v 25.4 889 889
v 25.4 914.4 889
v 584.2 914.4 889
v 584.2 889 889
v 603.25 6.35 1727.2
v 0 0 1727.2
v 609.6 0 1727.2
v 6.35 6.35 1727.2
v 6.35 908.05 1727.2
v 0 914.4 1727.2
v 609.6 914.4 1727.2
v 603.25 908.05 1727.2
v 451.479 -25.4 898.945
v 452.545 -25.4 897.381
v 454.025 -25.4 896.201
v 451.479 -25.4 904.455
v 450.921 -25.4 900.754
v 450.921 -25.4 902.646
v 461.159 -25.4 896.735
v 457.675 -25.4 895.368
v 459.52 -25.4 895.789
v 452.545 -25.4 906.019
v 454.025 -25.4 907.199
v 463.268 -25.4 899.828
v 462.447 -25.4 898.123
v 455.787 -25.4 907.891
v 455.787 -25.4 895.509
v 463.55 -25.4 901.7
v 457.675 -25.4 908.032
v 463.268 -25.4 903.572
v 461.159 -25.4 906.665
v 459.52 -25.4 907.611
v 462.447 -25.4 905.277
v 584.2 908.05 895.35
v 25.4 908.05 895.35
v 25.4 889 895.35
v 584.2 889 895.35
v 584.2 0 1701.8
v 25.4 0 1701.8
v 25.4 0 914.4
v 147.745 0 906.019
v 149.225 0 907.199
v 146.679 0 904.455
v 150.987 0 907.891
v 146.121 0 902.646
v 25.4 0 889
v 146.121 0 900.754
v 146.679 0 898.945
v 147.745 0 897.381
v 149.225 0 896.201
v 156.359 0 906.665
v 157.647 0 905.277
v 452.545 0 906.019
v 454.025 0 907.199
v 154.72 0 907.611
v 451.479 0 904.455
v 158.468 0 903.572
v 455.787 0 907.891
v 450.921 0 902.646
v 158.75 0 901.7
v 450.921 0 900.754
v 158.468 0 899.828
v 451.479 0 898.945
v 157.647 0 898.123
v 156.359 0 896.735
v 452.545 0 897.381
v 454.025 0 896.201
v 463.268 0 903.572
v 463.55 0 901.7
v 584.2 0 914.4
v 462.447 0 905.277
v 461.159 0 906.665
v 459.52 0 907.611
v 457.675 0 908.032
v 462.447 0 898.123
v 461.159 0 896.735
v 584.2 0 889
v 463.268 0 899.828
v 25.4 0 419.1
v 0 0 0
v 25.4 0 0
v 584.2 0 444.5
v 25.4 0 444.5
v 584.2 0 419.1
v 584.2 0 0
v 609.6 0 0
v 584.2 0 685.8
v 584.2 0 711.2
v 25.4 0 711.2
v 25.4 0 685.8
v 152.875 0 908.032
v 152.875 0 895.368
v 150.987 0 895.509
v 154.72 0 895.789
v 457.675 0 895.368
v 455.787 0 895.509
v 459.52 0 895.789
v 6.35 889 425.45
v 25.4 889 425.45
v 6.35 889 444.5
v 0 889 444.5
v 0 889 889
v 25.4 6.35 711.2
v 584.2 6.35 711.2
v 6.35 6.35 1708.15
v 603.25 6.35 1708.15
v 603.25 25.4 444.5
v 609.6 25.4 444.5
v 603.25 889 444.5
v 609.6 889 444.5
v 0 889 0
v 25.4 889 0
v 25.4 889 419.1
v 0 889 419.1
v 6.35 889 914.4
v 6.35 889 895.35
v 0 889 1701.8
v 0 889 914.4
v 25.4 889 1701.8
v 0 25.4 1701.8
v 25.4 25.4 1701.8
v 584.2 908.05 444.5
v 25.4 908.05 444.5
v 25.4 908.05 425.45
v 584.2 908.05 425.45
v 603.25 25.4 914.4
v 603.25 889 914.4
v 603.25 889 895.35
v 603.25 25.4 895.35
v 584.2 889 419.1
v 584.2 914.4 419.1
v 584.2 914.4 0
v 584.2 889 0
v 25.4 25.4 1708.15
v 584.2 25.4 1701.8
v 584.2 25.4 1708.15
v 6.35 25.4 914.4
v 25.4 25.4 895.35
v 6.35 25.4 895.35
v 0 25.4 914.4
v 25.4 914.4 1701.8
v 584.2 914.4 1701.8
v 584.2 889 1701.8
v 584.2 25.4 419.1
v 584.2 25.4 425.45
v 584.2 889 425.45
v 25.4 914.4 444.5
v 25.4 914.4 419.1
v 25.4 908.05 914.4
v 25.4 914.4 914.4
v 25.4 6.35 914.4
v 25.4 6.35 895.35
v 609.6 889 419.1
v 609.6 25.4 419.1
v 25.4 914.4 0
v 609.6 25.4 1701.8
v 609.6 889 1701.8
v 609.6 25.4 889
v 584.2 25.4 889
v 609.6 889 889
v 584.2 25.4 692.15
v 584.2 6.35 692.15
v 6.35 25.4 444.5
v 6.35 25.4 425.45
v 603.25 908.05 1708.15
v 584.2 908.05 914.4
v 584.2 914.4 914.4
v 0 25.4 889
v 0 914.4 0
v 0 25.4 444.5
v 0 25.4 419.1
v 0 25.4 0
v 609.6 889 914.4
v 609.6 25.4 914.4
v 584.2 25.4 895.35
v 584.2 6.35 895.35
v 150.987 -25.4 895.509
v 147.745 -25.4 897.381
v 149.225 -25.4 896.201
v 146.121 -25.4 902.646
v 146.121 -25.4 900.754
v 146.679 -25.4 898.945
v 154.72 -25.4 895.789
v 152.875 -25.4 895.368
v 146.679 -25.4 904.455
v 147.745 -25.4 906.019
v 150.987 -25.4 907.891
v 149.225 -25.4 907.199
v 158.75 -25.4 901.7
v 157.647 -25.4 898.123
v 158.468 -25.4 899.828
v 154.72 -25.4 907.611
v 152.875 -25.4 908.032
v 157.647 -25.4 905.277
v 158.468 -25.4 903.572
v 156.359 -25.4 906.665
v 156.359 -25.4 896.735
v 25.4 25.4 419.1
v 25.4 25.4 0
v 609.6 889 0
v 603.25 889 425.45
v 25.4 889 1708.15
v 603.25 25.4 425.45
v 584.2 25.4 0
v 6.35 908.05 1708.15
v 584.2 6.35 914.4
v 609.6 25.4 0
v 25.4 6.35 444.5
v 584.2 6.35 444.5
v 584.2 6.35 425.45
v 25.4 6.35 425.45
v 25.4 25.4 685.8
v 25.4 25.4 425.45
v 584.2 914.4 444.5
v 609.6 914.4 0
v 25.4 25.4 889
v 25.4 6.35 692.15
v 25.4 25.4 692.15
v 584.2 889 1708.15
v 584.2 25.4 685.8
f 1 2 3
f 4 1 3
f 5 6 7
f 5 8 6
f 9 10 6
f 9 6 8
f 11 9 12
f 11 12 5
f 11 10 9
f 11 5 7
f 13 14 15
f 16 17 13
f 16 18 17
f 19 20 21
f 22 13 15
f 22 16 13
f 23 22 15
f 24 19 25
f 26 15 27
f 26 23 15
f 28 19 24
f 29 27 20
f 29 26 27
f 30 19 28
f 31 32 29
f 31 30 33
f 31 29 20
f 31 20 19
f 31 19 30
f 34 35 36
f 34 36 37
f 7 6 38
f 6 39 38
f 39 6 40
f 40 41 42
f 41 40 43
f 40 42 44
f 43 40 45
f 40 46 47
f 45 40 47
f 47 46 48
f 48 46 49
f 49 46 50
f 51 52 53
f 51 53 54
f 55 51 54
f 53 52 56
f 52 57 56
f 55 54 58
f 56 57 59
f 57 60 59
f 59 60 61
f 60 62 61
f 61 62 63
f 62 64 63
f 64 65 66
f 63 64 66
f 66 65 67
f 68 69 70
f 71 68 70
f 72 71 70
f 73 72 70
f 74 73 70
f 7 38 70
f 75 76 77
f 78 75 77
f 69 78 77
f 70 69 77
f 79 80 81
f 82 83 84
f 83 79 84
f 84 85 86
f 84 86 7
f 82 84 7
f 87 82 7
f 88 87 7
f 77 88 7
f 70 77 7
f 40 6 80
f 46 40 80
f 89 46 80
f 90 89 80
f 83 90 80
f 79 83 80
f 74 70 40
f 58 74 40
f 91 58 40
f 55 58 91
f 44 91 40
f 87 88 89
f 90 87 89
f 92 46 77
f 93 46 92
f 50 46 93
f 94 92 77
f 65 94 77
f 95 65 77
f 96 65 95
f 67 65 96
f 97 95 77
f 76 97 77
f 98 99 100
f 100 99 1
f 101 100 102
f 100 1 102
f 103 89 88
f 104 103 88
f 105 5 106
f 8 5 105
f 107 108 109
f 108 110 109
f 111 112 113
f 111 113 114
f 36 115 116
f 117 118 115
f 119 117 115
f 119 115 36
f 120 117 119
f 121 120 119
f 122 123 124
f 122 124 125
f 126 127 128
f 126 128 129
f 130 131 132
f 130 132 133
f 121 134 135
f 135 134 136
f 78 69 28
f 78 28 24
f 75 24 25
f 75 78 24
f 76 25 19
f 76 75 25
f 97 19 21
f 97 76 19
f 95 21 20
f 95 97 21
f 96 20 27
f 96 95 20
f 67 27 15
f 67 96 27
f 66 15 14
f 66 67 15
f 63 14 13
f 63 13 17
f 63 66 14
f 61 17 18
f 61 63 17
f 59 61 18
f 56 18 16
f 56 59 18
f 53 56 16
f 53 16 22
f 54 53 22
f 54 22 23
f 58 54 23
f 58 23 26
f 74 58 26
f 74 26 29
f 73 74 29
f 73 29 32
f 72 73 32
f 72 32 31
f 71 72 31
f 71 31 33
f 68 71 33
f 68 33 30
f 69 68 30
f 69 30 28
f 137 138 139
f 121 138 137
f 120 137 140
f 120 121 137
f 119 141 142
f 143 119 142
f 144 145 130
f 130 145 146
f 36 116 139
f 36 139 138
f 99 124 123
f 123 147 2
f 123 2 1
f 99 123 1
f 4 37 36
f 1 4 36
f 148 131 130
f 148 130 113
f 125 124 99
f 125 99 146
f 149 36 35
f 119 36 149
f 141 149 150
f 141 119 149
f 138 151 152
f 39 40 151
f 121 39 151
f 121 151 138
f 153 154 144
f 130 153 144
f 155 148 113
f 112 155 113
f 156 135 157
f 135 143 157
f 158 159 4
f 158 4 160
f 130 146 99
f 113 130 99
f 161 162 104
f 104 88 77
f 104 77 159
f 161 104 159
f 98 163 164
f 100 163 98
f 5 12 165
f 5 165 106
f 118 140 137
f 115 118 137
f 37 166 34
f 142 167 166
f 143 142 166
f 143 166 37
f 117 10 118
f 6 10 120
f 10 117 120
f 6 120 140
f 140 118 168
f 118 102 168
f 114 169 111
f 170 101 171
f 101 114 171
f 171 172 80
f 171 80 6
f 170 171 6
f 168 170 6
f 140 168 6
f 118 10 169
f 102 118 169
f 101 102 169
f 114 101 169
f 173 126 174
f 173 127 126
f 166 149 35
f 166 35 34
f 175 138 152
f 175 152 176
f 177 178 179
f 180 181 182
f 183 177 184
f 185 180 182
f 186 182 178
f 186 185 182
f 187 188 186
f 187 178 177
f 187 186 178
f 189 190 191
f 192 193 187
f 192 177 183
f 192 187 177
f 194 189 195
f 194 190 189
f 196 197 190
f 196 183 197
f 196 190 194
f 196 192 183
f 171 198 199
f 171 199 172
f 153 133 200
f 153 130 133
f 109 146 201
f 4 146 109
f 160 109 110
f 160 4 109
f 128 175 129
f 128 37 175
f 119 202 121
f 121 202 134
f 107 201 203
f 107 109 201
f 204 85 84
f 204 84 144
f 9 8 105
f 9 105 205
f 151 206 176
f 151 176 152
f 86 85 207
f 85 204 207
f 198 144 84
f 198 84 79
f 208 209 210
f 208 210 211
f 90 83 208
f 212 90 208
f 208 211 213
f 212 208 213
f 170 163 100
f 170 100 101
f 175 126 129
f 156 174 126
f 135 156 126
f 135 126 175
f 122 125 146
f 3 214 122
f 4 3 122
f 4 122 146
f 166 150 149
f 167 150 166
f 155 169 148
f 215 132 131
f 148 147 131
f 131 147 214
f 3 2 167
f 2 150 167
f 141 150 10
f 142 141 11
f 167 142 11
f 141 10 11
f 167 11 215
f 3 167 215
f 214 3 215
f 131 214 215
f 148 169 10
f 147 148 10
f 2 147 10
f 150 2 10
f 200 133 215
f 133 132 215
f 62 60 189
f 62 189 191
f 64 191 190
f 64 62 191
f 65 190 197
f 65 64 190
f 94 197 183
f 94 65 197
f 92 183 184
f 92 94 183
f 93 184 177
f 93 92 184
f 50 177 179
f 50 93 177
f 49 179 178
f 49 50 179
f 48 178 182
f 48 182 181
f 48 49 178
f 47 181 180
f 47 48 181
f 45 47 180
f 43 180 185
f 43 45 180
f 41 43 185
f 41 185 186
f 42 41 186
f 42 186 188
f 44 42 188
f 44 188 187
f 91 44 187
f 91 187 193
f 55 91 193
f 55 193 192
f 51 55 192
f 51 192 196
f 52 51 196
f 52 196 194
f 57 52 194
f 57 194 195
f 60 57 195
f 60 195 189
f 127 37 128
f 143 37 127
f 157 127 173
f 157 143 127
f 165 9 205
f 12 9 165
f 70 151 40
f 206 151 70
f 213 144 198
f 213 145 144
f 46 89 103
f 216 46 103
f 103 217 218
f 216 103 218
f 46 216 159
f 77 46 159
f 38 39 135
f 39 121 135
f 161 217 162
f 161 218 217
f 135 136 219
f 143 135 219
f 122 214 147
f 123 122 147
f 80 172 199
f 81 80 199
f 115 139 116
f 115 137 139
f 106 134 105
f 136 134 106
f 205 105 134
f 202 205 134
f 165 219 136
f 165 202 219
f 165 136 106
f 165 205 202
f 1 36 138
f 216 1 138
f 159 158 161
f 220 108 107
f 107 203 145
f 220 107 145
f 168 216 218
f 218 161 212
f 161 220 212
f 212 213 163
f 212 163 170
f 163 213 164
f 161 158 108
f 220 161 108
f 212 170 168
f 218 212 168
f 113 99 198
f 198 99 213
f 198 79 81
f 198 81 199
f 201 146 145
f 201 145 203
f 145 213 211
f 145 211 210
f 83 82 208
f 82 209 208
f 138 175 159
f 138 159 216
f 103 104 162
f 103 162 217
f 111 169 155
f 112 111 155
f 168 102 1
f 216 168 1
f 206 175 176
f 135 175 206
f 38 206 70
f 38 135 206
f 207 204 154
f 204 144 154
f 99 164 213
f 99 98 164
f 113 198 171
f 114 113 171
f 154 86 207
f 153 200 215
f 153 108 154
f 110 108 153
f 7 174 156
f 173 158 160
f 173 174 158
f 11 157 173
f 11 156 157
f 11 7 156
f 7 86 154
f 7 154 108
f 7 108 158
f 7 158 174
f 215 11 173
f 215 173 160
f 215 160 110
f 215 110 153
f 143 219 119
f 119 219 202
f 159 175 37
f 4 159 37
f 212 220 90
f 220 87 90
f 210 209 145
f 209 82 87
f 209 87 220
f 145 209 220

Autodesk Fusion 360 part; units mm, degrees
sketch "Sketch1" plane through (0, 0, 0) normal (0, 0, 1) x (1, 0, 0)
  line L0 (0, 0) -> (25.4, 0)
  line L1 (25.4, 0) -> (25.4, 25.4)
  line L2 (25.4, 25.4) -> (0, 25.4)
  line L3 (0, 25.4) -> (0, 0)
  dimension "d1" = 25.4
  dimension "d2" = 25.4
extrude "Extrude1" add sketch "Sketch1" along normal blind 914.4 makes body 1
sketch "Sketch2" plane through (0, 0, 914.4) normal (0, 0, 1) x (1, 0, 0)
  line L0 (0, 25.4) -> (0, 0)
  line L1 (0, 0) -> (25.4, 0)
  line L2 (25.4, 0) -> (25.4, 25.4)
  line L3 (25.4, 25.4) -> (0, 25.4)
  line L4 (0, 0) -> (609.6, 0)
  line L5 (609.6, 0) -> (609.6, 914.4)
  line L6 (609.6, 914.4) -> (0, 914.4)
  line L7 (0, 914.4) -> (0, 0)
  dimension "d5" = 609.6
  dimension "d6" = 914.4
sketch "Sketch3" plane through (0, 0, 914.4) normal (0, 0, 1) x (1, 0, 0)
  line L0 (0, 914.4) -> (25.4, 914.4)
  line L1 (25.4, 914.4) -> (25.4, 889)
  line L2 (25.4, 889) -> (0, 889)
  line L3 (0, 889) -> (0, 914.4)
  line L4 (609.6, 914.4) -> (0, 914.4)
  line L5 (0, 914.4) -> (0, 0)
  line L6 (609.6, 914.4) -> (584.2, 914.4)
  line L7 (584.2, 914.4) -> (584.2, 889)
  line L8 (584.2, 889) -> (609.6, 889)
  line L9 (609.6, 889) -> (609.6, 914.4)
  line L10 (609.6, 0) -> (609.6, 914.4)
  line L11 (609.6, 0) -> (584.2, 0)
  line L12 (584.2, 0) -> (584.2, 25.4)
  line L13 (584.2, 25.4) -> (609.6, 25.4)
  line L14 (609.6, 25.4) -> (609.6, 0)
  line L15 (0, 0) -> (609.6, 0)
  dimension "d7" = 25.4
  dimension "d8" = 25.4
  dimension "d9" = 25.4
  dimension "d10" = 25.4
  dimension "d11" = 25.4
  dimension "d12" = 25.4
extrude "Extrude2" add sketch "Sketch3" against normal blind 914.4 separate body contours L0 L1 L2 L3 L4 L5 | L4 L6 L7 L8 L9 L10 | L10 L11 L12 L13 L14 L15 makes body 2 at (25.4, 905.9333, 304.8) makes body 3 at (609.6, 897.4667, 304.8) makes body 4 at (584.2, 8.4667, 304.8)
sketch "Sketch4" plane through (0, 0, 914.4) normal (0, 0, 1) x (1, 0, 0)
  line L0 (584.2, 889) -> (609.6, 889)
  line L1 (609.6, 889) -> (609.6, 25.4)
  line L2 (609.6, 25.4) -> (584.2, 25.4)
  line L3 (584.2, 25.4) -> (584.2, 889)
  line L4 (0, 914.4) -> (584.2, 914.4)
  line L5 (584.2, 914.4) -> (584.2, 889)
  line L6 (584.2, 889) -> (0, 889)
  line L7 (0, 889) -> (0, 914.4)
  line L8 (0, 914.4) -> (25.4, 914.4)
  line L9 (25.4, 914.4) -> (25.4, 0)
  line L10 (25.4, 0) -> (0, 0)
  line L11 (0, 0) -> (0, 914.4)
  line L12 (0, 0) -> (584.2, 0)
  line L13 (584.2, 0) -> (584.2, 25.4)
  line L14 (584.2, 25.4) -> (0, 25.4)
  line L15 (0, 25.4) -> (0, 0)
  line L16 (0, 0) -> (609.6, 0)
  line L17 (0, 914.4) -> (0, 0)
  line L18 (609.6, 914.4) -> (0, 914.4)
  line L19 (609.6, 0) -> (609.6, 914.4)
  line L20 (609.6, 889) -> (609.6, 914.4)
  line L21 (609.6, 914.4) -> (584.2, 914.4)
  dimension "d15" = 25.4
  dimension "d16" = 25.4
  dimension "d17" = 25.4
  dimension "d18" = 25.4
extrude "Extrude3" add sketch "Sketch4" against normal blind 25.4 separate body contours L0 L1 L2 L3 L19 | L4 L5 L6 L9 L18 | L9 L12 L13 L14 L16 | L6 L9 L11 L14 L17 makes body 5 at (397.9333, 897.4667, 914.4)
ref_plane "WorkPlane1" through (596.9, 901.7, 444.5) normal (0, 0, -1) x (-1, 0, 0)
sketch "Sketch5" plane through (0, 0, 444.5) normal (0, 0, -1) x (-1, 0, 0)
  line L0 (-609.6, 1066.8) -> (0, 1066.8)
  line L1 (0, 1066.8) -> (0, 0)
  line L2 (0, 0) -> (-609.6, 0)
  line L3 (-609.6, 0) -> (-609.6, 1066.8)
  line L4 (-584.2, 889) -> (-25.4, 889)
  line L5 (-584.2, 914.4) -> (-584.2, 889)
  line L6 (-584.2, 914.4) -> (-25.4, 914.4)
  line L7 (-25.4, 914.4) -> (-25.4, 889)
  line L8 (-25.4, 889) -> (0, 889)
  line L9 (0, 889) -> (0, 25.4)
  line L10 (-25.4, 25.4) -> (0, 25.4)
  line L11 (-25.4, 889) -> (-25.4, 25.4)
  line L12 (-584.2, 889) -> (-609.6, 889)
  line L13 (-584.2, 25.4) -> (-584.2, 889)
  line L14 (-609.6, 25.4) -> (-584.2, 25.4)
  line L15 (-609.6, 25.4) -> (-609.6, 889)
  line L16 (-25.4, 0) -> (-584.2, 0)
  line L17 (-584.2, 0) -> (-584.2, 25.4)
  line L18 (-584.2, 25.4) -> (-25.4, 25.4)
  line L19 (-25.4, 25.4) -> (-25.4, 0)
  dimension "d22" = 609.6
  dimension "d23" = 1066.8
extrude "Extrude4" add sketch "Sketch5" along normal blind 25.4 separate body contours L3 L12 L13 L14 L15 | L1 L8 L9 L10 L11 | L4 L5 L6 L7 | L2 L16 L17 L18 L19 makes body 6 at (397.9333, 25.4, 436.0333)
ref_plane "WorkPlane2" through (304.8, 901.7, 1727.2) normal (0, 0, 1) x (1, 0, 0)
sketch "Sketch6" plane through (0, 0, 1727.2) normal (0, 0, 1) x (1, 0, 0)
  line L0 (584.2, 889) -> (25.4, 889)
  line L1 (584.2, 914.4) -> (584.2, 889)
  line L2 (25.4, 914.4) -> (584.2, 914.4)
  line L3 (25.4, 889) -> (25.4, 914.4)
  line L4 (0, 889) -> (25.4, 889)
  line L5 (0, 25.4) -> (0, 889)
  line L6 (25.4, 25.4) -> (0, 25.4)
  line L7 (25.4, 889) -> (25.4, 25.4)
  line L8 (584.2, 889) -> (609.6, 889)
  line L9 (584.2, 25.4) -> (584.2, 889)
  line L10 (609.6, 25.4) -> (584.2, 25.4)
  line L11 (609.6, 889) -> (609.6, 25.4)
  line L12 (584.2, 0) -> (25.4, 0)
  line L13 (584.2, 25.4) -> (584.2, 0)
  line L14 (25.4, 25.4) -> (584.2, 25.4)
  line L15 (25.4, 0) -> (25.4, 25.4)
  line L16 (25.4, 25.4) -> (0, 25.4)
  line L17 (25.4, 0) -> (25.4, 25.4)
  line L18 (0, 0) -> (25.4, 0)
  line L19 (0, 25.4) -> (0, 0)
  line L20 (609.6, 25.4) -> (609.6, 0)
  line L21 (584.2, 25.4) -> (609.6, 25.4)
  line L22 (584.2, 0) -> (584.2, 25.4)
  line L23 (609.6, 0) -> (584.2, 0)
  line L24 (609.6, 914.4) -> (609.6, 889)
  line L25 (584.2, 914.4) -> (609.6, 914.4)
  line L26 (584.2, 889) -> (584.2, 914.4)
  line L27 (609.6, 889) -> (584.2, 889)
  line L28 (0, 889) -> (0, 914.4)
  line L29 (25.4, 889) -> (0, 889)
  line L30 (25.4, 914.4) -> (25.4, 889)
  line L31 (0, 914.4) -> (25.4, 914.4)
extrude "Extrude5" add sketch "Sketch6" against normal blind 812.8 contours L1 L8 L24 L25 L26 L27 | L3 L4 L28 L29 L30 L31 | L10 L13 L20 L21 L22 L23 | L6 L15 L16 L17 L18 L19 bodies 1 6 2 3 4 5
extrude "Extrude6" add sketch "Sketch6" against normal blind 25.4 contours L0 L1 L2 L3 L26 L30 | L8 L9 L10 L11 L21 L27 | L4 L5 L6 L7 L16 L29 | L12 L13 L14 L15 L17 L22 bodies 1
combine "Combine1" operation add target body 1 tool bodies 6
sketch "Sketch7" plane through (0, 0, 0) normal (0, -1, 0) x (1, 0, 0)
  line L0 (25.4, 444.5) -> (25.4, 889)
  line L1 (25.4, 889) -> (584.2, 889)
  line L2 (584.2, 889) -> (584.2, 444.5)
  line L3 (584.2, 444.5) -> (25.4, 444.5)
  line L4 (25.4, 419.1) -> (584.2, 419.1)
  line L5 (584.2, 419.1) -> (584.2, 0)
  line L6 (584.2, 0) -> (609.6, 0)
  line L7 (609.6, 0) -> (609.6, 1727.2)
  line L8 (609.6, 1727.2) -> (584.2, 1727.2)
  line L9 (584.2, 1727.2) -> (0, 1727.2)
  line L10 (0, 1727.2) -> (0, 0)
  line L11 (0, 0) -> (25.4, 0)
  line L12 (25.4, 0) -> (25.4, 419.1)
  line L13 (25.4, 1701.8) -> (584.2, 1701.8)
  line L14 (584.2, 1701.8) -> (584.2, 914.4)
  line L15 (584.2, 914.4) -> (25.4, 914.4)
  line L16 (25.4, 914.4) -> (25.4, 1701.8)
  circle A0 centre (457.2, 901.7) radius 6.35
  circle A1 centre (152.4, 901.7) radius 6.35
  line L17 (152.4, 901.7) -> (457.2, 901.7)
  line L18 (152.4, 901.7) -> (152.4, 685.8)
  line L19 (25.4, 711.2) -> (584.2, 711.2)
  line L20 (584.2, 711.2) -> (584.2, 685.8)
  line L21 (584.2, 685.8) -> (25.4, 685.8)
  line L22 (25.4, 685.8) -> (25.4, 711.2)
  dimension "d31" = 12.7
  dimension "d33" = 12.7
  dimension "d34" = 304.8
  dimension "d35" = 152.4
  dimension "d36" = 12.7
  dimension "d37" = 215.9
  dimension "d38" = 25.4
extrude "Extrude7" add sketch "Sketch7" against normal blind 25.4 contours L0 L18 L19 L21 L22 | L2 L18 L19 L20 L21 bodies 1
extrude "Extrude8" add sketch "Sketch7" along normal blind 25.4 contours A0 | A1 L17 L18 | A1 L17 L18 bodies 1
sketch "Sketch8" plane through (0, 0, 1727.2) normal (0, 0, 1) x (1, 0, 0)
  line L0 (0, 914.4) -> (0, 0)
  line L1 (0, 0) -> (584.2, 0)
  line L2 (584.2, 0) -> (609.6, 0)
  line L3 (609.6, 0) -> (609.6, 25.4)
  line L4 (609.6, 25.4) -> (609.6, 889)
  line L5 (609.6, 889) -> (609.6, 914.4)
  line L6 (609.6, 914.4) -> (0, 914.4)
  line L7 (25.4, 25.4) -> (25.4, 889)
  line L8 (25.4, 889) -> (584.2, 889)
  line L9 (584.2, 889) -> (584.2, 25.4)
  line L10 (584.2, 25.4) -> (25.4, 25.4)
  line L11 (6.35, 908.05) -> (603.25, 908.05)
  line L12 (603.25, 908.05) -> (603.25, 6.35)
  line L13 (603.25, 6.35) -> (6.35, 6.35)
  line L14 (6.35, 6.35) -> (6.35, 908.05)
  dimension "d43" = 6.35
  dimension "d44" = 6.35
  dimension "d45" = 6.35
  dimension "d46" = 6.35
extrude "Extrude9" cut sketch "Sketch8" against normal blind 19.05 contours L11 L12 L13 L14 bodies 1
sketch "Sketch9" plane through (0, 0, 914.4) normal (0, 0, 1) x (1, 0, 0)
  line L0 (25.4, 889) -> (0, 889)
  line L1 (0, 889) -> (0, 25.4)
  line L2 (0, 25.4) -> (25.4, 25.4)
  line L3 (25.4, 25.4) -> (25.4, 889)
  line L4 (6.35, 908.05) -> (603.25, 908.05)
  line L5 (603.25, 908.05) -> (603.25, 6.35)
  line L6 (603.25, 6.35) -> (6.35, 6.35)
  line L7 (6.35, 6.35) -> (6.35, 908.05)
  line L8 (25.4, 914.4) -> (25.4, 889)
  line L9 (25.4, 889) -> (584.2, 889)
  line L10 (584.2, 889) -> (584.2, 914.4)
  line L11 (584.2, 914.4) -> (25.4, 914.4)
  line L12 (584.2, 25.4) -> (609.6, 25.4)
  line L13 (609.6, 25.4) -> (609.6, 889)
  line L14 (609.6, 889) -> (584.2, 889)
  line L15 (584.2, 889) -> (584.2, 25.4)
  line L16 (584.2, 0) -> (584.2, 25.4)
  line L17 (584.2, 25.4) -> (25.4, 25.4)
  line L18 (25.4, 25.4) -> (25.4, 0)
  line L19 (25.4, 0) -> (584.2, 0)
  dimension "d49" = 6.35
  dimension "d50" = 6.35
  dimension "d51" = 6.35
  dimension "d52" = 6.35
extrude "Extrude10" cut sketch "Sketch9" against normal blind 19.05 contours L0 L2 L3 L7 | L3 L9 L15 L17 | L4 L8 L9 L10 | L6 L16 L17 L18 | L5 L12 L14 L15 bodies 1
sketch "Sketch10" plane through (0, 0, 711.2) normal (0, 0, 1) x (1, 0, 0)
  line L0 (25.4, 0) -> (584.2, 0)
  line L1 (584.2, 0) -> (584.2, 25.4)
  line L2 (584.2, 25.4) -> (25.4, 25.4)
  line L3 (25.4, 25.4) -> (25.4, 0)
  line L4 (15.2621, 59.1079) -> (599.5555, 59.1079)
  line L5 (599.5555, 59.1079) -> (599.5555, 6.35)
  line L6 (599.5555, 6.35) -> (15.2621, 6.35)
  line L7 (15.2621, 6.35) -> (15.2621, 59.1079)
  dimension "d55" = 6.35
extrude "Extrude11" cut sketch "Sketch10" against normal blind 19.05 contours L1 L2 L3 L6 bodies 1
sketch "Sketch11" plane through (0, 0, 444.5) normal (0, 0, 1) x (1, 0, 0)
  line L0 (584.2, 25.4) -> (25.4, 25.4)
  line L1 (25.4, 25.4) -> (25.4, 0)
  line L2 (25.4, 0) -> (584.2, 0)
  line L3 (584.2, 0) -> (584.2, 25.4)
  line L4 (25.4, 889) -> (0, 889)
  line L5 (0, 889) -> (0, 25.4)
  line L6 (0, 25.4) -> (25.4, 25.4)
  line L7 (25.4, 25.4) -> (25.4, 889)
  line L8 (584.2, 914.4) -> (25.4, 914.4)
  line L9 (584.2, 889) -> (25.4, 889)
  line L10 (609.6, 25.4) -> (609.6, 889)
  line L11 (584.2, 889) -> (584.2, 25.4)
  line L12 (584.2, 25.4) -> (609.6, 25.4)
  line L13 (609.6, 25.4) -> (609.6, 889)
  line L14 (609.6, 889) -> (584.2, 889)
  line L15 (584.2, 889) -> (584.2, 914.4)
  line L16 (584.2, 914.4) -> (25.4, 914.4)
  line L17 (25.4, 914.4) -> (25.4, 889)
  line L18 (25.4, 889) -> (584.2, 889)
  line L19 (6.35, 908.05) -> (603.25, 908.05)
  line L20 (603.25, 908.05) -> (603.25, 6.35)
  line L21 (603.25, 6.35) -> (6.35, 6.35)
  line L22 (6.35, 6.35) -> (6.35, 908.05)
  dimension "d58" = 6.35
  dimension "d59" = 6.35
  dimension "d60" = 6.35
  dimension "d61" = 6.35
extrude "Extrude12" cut sketch "Sketch11" against normal blind 19.05 contours L0 L1 L3 L21 | L11 L12 L14 L20 | L4 L6 L7 L22 | L9 L15 L17 L18 L19 bodies 1
equation "d21 = ( -35 / 2 ) * 1 in"
equation "d34 = 12.5 in - 0.25 in - 0.25 in"
equation "d43 = ( 1 / 4 ) * 1 in"
equation "d44 = d43"
equation "d45 = d44"
equation "d46 = d44"
equation "d47 = -1 in + d44"
equation "d49 = d44"
equation "d50 = d44"
equation "d51 = d44"
equation "d52 = d44"
equation "d53 = -1 in + d44"
equation "d55 = d44"
equation "d56 = -1 in + d44"
equation "d58 = d44"
equation "d59 = d44"
equation "d60 = d44"
equation "d61 = d44"
equation "d62 = -1 in + d44"
